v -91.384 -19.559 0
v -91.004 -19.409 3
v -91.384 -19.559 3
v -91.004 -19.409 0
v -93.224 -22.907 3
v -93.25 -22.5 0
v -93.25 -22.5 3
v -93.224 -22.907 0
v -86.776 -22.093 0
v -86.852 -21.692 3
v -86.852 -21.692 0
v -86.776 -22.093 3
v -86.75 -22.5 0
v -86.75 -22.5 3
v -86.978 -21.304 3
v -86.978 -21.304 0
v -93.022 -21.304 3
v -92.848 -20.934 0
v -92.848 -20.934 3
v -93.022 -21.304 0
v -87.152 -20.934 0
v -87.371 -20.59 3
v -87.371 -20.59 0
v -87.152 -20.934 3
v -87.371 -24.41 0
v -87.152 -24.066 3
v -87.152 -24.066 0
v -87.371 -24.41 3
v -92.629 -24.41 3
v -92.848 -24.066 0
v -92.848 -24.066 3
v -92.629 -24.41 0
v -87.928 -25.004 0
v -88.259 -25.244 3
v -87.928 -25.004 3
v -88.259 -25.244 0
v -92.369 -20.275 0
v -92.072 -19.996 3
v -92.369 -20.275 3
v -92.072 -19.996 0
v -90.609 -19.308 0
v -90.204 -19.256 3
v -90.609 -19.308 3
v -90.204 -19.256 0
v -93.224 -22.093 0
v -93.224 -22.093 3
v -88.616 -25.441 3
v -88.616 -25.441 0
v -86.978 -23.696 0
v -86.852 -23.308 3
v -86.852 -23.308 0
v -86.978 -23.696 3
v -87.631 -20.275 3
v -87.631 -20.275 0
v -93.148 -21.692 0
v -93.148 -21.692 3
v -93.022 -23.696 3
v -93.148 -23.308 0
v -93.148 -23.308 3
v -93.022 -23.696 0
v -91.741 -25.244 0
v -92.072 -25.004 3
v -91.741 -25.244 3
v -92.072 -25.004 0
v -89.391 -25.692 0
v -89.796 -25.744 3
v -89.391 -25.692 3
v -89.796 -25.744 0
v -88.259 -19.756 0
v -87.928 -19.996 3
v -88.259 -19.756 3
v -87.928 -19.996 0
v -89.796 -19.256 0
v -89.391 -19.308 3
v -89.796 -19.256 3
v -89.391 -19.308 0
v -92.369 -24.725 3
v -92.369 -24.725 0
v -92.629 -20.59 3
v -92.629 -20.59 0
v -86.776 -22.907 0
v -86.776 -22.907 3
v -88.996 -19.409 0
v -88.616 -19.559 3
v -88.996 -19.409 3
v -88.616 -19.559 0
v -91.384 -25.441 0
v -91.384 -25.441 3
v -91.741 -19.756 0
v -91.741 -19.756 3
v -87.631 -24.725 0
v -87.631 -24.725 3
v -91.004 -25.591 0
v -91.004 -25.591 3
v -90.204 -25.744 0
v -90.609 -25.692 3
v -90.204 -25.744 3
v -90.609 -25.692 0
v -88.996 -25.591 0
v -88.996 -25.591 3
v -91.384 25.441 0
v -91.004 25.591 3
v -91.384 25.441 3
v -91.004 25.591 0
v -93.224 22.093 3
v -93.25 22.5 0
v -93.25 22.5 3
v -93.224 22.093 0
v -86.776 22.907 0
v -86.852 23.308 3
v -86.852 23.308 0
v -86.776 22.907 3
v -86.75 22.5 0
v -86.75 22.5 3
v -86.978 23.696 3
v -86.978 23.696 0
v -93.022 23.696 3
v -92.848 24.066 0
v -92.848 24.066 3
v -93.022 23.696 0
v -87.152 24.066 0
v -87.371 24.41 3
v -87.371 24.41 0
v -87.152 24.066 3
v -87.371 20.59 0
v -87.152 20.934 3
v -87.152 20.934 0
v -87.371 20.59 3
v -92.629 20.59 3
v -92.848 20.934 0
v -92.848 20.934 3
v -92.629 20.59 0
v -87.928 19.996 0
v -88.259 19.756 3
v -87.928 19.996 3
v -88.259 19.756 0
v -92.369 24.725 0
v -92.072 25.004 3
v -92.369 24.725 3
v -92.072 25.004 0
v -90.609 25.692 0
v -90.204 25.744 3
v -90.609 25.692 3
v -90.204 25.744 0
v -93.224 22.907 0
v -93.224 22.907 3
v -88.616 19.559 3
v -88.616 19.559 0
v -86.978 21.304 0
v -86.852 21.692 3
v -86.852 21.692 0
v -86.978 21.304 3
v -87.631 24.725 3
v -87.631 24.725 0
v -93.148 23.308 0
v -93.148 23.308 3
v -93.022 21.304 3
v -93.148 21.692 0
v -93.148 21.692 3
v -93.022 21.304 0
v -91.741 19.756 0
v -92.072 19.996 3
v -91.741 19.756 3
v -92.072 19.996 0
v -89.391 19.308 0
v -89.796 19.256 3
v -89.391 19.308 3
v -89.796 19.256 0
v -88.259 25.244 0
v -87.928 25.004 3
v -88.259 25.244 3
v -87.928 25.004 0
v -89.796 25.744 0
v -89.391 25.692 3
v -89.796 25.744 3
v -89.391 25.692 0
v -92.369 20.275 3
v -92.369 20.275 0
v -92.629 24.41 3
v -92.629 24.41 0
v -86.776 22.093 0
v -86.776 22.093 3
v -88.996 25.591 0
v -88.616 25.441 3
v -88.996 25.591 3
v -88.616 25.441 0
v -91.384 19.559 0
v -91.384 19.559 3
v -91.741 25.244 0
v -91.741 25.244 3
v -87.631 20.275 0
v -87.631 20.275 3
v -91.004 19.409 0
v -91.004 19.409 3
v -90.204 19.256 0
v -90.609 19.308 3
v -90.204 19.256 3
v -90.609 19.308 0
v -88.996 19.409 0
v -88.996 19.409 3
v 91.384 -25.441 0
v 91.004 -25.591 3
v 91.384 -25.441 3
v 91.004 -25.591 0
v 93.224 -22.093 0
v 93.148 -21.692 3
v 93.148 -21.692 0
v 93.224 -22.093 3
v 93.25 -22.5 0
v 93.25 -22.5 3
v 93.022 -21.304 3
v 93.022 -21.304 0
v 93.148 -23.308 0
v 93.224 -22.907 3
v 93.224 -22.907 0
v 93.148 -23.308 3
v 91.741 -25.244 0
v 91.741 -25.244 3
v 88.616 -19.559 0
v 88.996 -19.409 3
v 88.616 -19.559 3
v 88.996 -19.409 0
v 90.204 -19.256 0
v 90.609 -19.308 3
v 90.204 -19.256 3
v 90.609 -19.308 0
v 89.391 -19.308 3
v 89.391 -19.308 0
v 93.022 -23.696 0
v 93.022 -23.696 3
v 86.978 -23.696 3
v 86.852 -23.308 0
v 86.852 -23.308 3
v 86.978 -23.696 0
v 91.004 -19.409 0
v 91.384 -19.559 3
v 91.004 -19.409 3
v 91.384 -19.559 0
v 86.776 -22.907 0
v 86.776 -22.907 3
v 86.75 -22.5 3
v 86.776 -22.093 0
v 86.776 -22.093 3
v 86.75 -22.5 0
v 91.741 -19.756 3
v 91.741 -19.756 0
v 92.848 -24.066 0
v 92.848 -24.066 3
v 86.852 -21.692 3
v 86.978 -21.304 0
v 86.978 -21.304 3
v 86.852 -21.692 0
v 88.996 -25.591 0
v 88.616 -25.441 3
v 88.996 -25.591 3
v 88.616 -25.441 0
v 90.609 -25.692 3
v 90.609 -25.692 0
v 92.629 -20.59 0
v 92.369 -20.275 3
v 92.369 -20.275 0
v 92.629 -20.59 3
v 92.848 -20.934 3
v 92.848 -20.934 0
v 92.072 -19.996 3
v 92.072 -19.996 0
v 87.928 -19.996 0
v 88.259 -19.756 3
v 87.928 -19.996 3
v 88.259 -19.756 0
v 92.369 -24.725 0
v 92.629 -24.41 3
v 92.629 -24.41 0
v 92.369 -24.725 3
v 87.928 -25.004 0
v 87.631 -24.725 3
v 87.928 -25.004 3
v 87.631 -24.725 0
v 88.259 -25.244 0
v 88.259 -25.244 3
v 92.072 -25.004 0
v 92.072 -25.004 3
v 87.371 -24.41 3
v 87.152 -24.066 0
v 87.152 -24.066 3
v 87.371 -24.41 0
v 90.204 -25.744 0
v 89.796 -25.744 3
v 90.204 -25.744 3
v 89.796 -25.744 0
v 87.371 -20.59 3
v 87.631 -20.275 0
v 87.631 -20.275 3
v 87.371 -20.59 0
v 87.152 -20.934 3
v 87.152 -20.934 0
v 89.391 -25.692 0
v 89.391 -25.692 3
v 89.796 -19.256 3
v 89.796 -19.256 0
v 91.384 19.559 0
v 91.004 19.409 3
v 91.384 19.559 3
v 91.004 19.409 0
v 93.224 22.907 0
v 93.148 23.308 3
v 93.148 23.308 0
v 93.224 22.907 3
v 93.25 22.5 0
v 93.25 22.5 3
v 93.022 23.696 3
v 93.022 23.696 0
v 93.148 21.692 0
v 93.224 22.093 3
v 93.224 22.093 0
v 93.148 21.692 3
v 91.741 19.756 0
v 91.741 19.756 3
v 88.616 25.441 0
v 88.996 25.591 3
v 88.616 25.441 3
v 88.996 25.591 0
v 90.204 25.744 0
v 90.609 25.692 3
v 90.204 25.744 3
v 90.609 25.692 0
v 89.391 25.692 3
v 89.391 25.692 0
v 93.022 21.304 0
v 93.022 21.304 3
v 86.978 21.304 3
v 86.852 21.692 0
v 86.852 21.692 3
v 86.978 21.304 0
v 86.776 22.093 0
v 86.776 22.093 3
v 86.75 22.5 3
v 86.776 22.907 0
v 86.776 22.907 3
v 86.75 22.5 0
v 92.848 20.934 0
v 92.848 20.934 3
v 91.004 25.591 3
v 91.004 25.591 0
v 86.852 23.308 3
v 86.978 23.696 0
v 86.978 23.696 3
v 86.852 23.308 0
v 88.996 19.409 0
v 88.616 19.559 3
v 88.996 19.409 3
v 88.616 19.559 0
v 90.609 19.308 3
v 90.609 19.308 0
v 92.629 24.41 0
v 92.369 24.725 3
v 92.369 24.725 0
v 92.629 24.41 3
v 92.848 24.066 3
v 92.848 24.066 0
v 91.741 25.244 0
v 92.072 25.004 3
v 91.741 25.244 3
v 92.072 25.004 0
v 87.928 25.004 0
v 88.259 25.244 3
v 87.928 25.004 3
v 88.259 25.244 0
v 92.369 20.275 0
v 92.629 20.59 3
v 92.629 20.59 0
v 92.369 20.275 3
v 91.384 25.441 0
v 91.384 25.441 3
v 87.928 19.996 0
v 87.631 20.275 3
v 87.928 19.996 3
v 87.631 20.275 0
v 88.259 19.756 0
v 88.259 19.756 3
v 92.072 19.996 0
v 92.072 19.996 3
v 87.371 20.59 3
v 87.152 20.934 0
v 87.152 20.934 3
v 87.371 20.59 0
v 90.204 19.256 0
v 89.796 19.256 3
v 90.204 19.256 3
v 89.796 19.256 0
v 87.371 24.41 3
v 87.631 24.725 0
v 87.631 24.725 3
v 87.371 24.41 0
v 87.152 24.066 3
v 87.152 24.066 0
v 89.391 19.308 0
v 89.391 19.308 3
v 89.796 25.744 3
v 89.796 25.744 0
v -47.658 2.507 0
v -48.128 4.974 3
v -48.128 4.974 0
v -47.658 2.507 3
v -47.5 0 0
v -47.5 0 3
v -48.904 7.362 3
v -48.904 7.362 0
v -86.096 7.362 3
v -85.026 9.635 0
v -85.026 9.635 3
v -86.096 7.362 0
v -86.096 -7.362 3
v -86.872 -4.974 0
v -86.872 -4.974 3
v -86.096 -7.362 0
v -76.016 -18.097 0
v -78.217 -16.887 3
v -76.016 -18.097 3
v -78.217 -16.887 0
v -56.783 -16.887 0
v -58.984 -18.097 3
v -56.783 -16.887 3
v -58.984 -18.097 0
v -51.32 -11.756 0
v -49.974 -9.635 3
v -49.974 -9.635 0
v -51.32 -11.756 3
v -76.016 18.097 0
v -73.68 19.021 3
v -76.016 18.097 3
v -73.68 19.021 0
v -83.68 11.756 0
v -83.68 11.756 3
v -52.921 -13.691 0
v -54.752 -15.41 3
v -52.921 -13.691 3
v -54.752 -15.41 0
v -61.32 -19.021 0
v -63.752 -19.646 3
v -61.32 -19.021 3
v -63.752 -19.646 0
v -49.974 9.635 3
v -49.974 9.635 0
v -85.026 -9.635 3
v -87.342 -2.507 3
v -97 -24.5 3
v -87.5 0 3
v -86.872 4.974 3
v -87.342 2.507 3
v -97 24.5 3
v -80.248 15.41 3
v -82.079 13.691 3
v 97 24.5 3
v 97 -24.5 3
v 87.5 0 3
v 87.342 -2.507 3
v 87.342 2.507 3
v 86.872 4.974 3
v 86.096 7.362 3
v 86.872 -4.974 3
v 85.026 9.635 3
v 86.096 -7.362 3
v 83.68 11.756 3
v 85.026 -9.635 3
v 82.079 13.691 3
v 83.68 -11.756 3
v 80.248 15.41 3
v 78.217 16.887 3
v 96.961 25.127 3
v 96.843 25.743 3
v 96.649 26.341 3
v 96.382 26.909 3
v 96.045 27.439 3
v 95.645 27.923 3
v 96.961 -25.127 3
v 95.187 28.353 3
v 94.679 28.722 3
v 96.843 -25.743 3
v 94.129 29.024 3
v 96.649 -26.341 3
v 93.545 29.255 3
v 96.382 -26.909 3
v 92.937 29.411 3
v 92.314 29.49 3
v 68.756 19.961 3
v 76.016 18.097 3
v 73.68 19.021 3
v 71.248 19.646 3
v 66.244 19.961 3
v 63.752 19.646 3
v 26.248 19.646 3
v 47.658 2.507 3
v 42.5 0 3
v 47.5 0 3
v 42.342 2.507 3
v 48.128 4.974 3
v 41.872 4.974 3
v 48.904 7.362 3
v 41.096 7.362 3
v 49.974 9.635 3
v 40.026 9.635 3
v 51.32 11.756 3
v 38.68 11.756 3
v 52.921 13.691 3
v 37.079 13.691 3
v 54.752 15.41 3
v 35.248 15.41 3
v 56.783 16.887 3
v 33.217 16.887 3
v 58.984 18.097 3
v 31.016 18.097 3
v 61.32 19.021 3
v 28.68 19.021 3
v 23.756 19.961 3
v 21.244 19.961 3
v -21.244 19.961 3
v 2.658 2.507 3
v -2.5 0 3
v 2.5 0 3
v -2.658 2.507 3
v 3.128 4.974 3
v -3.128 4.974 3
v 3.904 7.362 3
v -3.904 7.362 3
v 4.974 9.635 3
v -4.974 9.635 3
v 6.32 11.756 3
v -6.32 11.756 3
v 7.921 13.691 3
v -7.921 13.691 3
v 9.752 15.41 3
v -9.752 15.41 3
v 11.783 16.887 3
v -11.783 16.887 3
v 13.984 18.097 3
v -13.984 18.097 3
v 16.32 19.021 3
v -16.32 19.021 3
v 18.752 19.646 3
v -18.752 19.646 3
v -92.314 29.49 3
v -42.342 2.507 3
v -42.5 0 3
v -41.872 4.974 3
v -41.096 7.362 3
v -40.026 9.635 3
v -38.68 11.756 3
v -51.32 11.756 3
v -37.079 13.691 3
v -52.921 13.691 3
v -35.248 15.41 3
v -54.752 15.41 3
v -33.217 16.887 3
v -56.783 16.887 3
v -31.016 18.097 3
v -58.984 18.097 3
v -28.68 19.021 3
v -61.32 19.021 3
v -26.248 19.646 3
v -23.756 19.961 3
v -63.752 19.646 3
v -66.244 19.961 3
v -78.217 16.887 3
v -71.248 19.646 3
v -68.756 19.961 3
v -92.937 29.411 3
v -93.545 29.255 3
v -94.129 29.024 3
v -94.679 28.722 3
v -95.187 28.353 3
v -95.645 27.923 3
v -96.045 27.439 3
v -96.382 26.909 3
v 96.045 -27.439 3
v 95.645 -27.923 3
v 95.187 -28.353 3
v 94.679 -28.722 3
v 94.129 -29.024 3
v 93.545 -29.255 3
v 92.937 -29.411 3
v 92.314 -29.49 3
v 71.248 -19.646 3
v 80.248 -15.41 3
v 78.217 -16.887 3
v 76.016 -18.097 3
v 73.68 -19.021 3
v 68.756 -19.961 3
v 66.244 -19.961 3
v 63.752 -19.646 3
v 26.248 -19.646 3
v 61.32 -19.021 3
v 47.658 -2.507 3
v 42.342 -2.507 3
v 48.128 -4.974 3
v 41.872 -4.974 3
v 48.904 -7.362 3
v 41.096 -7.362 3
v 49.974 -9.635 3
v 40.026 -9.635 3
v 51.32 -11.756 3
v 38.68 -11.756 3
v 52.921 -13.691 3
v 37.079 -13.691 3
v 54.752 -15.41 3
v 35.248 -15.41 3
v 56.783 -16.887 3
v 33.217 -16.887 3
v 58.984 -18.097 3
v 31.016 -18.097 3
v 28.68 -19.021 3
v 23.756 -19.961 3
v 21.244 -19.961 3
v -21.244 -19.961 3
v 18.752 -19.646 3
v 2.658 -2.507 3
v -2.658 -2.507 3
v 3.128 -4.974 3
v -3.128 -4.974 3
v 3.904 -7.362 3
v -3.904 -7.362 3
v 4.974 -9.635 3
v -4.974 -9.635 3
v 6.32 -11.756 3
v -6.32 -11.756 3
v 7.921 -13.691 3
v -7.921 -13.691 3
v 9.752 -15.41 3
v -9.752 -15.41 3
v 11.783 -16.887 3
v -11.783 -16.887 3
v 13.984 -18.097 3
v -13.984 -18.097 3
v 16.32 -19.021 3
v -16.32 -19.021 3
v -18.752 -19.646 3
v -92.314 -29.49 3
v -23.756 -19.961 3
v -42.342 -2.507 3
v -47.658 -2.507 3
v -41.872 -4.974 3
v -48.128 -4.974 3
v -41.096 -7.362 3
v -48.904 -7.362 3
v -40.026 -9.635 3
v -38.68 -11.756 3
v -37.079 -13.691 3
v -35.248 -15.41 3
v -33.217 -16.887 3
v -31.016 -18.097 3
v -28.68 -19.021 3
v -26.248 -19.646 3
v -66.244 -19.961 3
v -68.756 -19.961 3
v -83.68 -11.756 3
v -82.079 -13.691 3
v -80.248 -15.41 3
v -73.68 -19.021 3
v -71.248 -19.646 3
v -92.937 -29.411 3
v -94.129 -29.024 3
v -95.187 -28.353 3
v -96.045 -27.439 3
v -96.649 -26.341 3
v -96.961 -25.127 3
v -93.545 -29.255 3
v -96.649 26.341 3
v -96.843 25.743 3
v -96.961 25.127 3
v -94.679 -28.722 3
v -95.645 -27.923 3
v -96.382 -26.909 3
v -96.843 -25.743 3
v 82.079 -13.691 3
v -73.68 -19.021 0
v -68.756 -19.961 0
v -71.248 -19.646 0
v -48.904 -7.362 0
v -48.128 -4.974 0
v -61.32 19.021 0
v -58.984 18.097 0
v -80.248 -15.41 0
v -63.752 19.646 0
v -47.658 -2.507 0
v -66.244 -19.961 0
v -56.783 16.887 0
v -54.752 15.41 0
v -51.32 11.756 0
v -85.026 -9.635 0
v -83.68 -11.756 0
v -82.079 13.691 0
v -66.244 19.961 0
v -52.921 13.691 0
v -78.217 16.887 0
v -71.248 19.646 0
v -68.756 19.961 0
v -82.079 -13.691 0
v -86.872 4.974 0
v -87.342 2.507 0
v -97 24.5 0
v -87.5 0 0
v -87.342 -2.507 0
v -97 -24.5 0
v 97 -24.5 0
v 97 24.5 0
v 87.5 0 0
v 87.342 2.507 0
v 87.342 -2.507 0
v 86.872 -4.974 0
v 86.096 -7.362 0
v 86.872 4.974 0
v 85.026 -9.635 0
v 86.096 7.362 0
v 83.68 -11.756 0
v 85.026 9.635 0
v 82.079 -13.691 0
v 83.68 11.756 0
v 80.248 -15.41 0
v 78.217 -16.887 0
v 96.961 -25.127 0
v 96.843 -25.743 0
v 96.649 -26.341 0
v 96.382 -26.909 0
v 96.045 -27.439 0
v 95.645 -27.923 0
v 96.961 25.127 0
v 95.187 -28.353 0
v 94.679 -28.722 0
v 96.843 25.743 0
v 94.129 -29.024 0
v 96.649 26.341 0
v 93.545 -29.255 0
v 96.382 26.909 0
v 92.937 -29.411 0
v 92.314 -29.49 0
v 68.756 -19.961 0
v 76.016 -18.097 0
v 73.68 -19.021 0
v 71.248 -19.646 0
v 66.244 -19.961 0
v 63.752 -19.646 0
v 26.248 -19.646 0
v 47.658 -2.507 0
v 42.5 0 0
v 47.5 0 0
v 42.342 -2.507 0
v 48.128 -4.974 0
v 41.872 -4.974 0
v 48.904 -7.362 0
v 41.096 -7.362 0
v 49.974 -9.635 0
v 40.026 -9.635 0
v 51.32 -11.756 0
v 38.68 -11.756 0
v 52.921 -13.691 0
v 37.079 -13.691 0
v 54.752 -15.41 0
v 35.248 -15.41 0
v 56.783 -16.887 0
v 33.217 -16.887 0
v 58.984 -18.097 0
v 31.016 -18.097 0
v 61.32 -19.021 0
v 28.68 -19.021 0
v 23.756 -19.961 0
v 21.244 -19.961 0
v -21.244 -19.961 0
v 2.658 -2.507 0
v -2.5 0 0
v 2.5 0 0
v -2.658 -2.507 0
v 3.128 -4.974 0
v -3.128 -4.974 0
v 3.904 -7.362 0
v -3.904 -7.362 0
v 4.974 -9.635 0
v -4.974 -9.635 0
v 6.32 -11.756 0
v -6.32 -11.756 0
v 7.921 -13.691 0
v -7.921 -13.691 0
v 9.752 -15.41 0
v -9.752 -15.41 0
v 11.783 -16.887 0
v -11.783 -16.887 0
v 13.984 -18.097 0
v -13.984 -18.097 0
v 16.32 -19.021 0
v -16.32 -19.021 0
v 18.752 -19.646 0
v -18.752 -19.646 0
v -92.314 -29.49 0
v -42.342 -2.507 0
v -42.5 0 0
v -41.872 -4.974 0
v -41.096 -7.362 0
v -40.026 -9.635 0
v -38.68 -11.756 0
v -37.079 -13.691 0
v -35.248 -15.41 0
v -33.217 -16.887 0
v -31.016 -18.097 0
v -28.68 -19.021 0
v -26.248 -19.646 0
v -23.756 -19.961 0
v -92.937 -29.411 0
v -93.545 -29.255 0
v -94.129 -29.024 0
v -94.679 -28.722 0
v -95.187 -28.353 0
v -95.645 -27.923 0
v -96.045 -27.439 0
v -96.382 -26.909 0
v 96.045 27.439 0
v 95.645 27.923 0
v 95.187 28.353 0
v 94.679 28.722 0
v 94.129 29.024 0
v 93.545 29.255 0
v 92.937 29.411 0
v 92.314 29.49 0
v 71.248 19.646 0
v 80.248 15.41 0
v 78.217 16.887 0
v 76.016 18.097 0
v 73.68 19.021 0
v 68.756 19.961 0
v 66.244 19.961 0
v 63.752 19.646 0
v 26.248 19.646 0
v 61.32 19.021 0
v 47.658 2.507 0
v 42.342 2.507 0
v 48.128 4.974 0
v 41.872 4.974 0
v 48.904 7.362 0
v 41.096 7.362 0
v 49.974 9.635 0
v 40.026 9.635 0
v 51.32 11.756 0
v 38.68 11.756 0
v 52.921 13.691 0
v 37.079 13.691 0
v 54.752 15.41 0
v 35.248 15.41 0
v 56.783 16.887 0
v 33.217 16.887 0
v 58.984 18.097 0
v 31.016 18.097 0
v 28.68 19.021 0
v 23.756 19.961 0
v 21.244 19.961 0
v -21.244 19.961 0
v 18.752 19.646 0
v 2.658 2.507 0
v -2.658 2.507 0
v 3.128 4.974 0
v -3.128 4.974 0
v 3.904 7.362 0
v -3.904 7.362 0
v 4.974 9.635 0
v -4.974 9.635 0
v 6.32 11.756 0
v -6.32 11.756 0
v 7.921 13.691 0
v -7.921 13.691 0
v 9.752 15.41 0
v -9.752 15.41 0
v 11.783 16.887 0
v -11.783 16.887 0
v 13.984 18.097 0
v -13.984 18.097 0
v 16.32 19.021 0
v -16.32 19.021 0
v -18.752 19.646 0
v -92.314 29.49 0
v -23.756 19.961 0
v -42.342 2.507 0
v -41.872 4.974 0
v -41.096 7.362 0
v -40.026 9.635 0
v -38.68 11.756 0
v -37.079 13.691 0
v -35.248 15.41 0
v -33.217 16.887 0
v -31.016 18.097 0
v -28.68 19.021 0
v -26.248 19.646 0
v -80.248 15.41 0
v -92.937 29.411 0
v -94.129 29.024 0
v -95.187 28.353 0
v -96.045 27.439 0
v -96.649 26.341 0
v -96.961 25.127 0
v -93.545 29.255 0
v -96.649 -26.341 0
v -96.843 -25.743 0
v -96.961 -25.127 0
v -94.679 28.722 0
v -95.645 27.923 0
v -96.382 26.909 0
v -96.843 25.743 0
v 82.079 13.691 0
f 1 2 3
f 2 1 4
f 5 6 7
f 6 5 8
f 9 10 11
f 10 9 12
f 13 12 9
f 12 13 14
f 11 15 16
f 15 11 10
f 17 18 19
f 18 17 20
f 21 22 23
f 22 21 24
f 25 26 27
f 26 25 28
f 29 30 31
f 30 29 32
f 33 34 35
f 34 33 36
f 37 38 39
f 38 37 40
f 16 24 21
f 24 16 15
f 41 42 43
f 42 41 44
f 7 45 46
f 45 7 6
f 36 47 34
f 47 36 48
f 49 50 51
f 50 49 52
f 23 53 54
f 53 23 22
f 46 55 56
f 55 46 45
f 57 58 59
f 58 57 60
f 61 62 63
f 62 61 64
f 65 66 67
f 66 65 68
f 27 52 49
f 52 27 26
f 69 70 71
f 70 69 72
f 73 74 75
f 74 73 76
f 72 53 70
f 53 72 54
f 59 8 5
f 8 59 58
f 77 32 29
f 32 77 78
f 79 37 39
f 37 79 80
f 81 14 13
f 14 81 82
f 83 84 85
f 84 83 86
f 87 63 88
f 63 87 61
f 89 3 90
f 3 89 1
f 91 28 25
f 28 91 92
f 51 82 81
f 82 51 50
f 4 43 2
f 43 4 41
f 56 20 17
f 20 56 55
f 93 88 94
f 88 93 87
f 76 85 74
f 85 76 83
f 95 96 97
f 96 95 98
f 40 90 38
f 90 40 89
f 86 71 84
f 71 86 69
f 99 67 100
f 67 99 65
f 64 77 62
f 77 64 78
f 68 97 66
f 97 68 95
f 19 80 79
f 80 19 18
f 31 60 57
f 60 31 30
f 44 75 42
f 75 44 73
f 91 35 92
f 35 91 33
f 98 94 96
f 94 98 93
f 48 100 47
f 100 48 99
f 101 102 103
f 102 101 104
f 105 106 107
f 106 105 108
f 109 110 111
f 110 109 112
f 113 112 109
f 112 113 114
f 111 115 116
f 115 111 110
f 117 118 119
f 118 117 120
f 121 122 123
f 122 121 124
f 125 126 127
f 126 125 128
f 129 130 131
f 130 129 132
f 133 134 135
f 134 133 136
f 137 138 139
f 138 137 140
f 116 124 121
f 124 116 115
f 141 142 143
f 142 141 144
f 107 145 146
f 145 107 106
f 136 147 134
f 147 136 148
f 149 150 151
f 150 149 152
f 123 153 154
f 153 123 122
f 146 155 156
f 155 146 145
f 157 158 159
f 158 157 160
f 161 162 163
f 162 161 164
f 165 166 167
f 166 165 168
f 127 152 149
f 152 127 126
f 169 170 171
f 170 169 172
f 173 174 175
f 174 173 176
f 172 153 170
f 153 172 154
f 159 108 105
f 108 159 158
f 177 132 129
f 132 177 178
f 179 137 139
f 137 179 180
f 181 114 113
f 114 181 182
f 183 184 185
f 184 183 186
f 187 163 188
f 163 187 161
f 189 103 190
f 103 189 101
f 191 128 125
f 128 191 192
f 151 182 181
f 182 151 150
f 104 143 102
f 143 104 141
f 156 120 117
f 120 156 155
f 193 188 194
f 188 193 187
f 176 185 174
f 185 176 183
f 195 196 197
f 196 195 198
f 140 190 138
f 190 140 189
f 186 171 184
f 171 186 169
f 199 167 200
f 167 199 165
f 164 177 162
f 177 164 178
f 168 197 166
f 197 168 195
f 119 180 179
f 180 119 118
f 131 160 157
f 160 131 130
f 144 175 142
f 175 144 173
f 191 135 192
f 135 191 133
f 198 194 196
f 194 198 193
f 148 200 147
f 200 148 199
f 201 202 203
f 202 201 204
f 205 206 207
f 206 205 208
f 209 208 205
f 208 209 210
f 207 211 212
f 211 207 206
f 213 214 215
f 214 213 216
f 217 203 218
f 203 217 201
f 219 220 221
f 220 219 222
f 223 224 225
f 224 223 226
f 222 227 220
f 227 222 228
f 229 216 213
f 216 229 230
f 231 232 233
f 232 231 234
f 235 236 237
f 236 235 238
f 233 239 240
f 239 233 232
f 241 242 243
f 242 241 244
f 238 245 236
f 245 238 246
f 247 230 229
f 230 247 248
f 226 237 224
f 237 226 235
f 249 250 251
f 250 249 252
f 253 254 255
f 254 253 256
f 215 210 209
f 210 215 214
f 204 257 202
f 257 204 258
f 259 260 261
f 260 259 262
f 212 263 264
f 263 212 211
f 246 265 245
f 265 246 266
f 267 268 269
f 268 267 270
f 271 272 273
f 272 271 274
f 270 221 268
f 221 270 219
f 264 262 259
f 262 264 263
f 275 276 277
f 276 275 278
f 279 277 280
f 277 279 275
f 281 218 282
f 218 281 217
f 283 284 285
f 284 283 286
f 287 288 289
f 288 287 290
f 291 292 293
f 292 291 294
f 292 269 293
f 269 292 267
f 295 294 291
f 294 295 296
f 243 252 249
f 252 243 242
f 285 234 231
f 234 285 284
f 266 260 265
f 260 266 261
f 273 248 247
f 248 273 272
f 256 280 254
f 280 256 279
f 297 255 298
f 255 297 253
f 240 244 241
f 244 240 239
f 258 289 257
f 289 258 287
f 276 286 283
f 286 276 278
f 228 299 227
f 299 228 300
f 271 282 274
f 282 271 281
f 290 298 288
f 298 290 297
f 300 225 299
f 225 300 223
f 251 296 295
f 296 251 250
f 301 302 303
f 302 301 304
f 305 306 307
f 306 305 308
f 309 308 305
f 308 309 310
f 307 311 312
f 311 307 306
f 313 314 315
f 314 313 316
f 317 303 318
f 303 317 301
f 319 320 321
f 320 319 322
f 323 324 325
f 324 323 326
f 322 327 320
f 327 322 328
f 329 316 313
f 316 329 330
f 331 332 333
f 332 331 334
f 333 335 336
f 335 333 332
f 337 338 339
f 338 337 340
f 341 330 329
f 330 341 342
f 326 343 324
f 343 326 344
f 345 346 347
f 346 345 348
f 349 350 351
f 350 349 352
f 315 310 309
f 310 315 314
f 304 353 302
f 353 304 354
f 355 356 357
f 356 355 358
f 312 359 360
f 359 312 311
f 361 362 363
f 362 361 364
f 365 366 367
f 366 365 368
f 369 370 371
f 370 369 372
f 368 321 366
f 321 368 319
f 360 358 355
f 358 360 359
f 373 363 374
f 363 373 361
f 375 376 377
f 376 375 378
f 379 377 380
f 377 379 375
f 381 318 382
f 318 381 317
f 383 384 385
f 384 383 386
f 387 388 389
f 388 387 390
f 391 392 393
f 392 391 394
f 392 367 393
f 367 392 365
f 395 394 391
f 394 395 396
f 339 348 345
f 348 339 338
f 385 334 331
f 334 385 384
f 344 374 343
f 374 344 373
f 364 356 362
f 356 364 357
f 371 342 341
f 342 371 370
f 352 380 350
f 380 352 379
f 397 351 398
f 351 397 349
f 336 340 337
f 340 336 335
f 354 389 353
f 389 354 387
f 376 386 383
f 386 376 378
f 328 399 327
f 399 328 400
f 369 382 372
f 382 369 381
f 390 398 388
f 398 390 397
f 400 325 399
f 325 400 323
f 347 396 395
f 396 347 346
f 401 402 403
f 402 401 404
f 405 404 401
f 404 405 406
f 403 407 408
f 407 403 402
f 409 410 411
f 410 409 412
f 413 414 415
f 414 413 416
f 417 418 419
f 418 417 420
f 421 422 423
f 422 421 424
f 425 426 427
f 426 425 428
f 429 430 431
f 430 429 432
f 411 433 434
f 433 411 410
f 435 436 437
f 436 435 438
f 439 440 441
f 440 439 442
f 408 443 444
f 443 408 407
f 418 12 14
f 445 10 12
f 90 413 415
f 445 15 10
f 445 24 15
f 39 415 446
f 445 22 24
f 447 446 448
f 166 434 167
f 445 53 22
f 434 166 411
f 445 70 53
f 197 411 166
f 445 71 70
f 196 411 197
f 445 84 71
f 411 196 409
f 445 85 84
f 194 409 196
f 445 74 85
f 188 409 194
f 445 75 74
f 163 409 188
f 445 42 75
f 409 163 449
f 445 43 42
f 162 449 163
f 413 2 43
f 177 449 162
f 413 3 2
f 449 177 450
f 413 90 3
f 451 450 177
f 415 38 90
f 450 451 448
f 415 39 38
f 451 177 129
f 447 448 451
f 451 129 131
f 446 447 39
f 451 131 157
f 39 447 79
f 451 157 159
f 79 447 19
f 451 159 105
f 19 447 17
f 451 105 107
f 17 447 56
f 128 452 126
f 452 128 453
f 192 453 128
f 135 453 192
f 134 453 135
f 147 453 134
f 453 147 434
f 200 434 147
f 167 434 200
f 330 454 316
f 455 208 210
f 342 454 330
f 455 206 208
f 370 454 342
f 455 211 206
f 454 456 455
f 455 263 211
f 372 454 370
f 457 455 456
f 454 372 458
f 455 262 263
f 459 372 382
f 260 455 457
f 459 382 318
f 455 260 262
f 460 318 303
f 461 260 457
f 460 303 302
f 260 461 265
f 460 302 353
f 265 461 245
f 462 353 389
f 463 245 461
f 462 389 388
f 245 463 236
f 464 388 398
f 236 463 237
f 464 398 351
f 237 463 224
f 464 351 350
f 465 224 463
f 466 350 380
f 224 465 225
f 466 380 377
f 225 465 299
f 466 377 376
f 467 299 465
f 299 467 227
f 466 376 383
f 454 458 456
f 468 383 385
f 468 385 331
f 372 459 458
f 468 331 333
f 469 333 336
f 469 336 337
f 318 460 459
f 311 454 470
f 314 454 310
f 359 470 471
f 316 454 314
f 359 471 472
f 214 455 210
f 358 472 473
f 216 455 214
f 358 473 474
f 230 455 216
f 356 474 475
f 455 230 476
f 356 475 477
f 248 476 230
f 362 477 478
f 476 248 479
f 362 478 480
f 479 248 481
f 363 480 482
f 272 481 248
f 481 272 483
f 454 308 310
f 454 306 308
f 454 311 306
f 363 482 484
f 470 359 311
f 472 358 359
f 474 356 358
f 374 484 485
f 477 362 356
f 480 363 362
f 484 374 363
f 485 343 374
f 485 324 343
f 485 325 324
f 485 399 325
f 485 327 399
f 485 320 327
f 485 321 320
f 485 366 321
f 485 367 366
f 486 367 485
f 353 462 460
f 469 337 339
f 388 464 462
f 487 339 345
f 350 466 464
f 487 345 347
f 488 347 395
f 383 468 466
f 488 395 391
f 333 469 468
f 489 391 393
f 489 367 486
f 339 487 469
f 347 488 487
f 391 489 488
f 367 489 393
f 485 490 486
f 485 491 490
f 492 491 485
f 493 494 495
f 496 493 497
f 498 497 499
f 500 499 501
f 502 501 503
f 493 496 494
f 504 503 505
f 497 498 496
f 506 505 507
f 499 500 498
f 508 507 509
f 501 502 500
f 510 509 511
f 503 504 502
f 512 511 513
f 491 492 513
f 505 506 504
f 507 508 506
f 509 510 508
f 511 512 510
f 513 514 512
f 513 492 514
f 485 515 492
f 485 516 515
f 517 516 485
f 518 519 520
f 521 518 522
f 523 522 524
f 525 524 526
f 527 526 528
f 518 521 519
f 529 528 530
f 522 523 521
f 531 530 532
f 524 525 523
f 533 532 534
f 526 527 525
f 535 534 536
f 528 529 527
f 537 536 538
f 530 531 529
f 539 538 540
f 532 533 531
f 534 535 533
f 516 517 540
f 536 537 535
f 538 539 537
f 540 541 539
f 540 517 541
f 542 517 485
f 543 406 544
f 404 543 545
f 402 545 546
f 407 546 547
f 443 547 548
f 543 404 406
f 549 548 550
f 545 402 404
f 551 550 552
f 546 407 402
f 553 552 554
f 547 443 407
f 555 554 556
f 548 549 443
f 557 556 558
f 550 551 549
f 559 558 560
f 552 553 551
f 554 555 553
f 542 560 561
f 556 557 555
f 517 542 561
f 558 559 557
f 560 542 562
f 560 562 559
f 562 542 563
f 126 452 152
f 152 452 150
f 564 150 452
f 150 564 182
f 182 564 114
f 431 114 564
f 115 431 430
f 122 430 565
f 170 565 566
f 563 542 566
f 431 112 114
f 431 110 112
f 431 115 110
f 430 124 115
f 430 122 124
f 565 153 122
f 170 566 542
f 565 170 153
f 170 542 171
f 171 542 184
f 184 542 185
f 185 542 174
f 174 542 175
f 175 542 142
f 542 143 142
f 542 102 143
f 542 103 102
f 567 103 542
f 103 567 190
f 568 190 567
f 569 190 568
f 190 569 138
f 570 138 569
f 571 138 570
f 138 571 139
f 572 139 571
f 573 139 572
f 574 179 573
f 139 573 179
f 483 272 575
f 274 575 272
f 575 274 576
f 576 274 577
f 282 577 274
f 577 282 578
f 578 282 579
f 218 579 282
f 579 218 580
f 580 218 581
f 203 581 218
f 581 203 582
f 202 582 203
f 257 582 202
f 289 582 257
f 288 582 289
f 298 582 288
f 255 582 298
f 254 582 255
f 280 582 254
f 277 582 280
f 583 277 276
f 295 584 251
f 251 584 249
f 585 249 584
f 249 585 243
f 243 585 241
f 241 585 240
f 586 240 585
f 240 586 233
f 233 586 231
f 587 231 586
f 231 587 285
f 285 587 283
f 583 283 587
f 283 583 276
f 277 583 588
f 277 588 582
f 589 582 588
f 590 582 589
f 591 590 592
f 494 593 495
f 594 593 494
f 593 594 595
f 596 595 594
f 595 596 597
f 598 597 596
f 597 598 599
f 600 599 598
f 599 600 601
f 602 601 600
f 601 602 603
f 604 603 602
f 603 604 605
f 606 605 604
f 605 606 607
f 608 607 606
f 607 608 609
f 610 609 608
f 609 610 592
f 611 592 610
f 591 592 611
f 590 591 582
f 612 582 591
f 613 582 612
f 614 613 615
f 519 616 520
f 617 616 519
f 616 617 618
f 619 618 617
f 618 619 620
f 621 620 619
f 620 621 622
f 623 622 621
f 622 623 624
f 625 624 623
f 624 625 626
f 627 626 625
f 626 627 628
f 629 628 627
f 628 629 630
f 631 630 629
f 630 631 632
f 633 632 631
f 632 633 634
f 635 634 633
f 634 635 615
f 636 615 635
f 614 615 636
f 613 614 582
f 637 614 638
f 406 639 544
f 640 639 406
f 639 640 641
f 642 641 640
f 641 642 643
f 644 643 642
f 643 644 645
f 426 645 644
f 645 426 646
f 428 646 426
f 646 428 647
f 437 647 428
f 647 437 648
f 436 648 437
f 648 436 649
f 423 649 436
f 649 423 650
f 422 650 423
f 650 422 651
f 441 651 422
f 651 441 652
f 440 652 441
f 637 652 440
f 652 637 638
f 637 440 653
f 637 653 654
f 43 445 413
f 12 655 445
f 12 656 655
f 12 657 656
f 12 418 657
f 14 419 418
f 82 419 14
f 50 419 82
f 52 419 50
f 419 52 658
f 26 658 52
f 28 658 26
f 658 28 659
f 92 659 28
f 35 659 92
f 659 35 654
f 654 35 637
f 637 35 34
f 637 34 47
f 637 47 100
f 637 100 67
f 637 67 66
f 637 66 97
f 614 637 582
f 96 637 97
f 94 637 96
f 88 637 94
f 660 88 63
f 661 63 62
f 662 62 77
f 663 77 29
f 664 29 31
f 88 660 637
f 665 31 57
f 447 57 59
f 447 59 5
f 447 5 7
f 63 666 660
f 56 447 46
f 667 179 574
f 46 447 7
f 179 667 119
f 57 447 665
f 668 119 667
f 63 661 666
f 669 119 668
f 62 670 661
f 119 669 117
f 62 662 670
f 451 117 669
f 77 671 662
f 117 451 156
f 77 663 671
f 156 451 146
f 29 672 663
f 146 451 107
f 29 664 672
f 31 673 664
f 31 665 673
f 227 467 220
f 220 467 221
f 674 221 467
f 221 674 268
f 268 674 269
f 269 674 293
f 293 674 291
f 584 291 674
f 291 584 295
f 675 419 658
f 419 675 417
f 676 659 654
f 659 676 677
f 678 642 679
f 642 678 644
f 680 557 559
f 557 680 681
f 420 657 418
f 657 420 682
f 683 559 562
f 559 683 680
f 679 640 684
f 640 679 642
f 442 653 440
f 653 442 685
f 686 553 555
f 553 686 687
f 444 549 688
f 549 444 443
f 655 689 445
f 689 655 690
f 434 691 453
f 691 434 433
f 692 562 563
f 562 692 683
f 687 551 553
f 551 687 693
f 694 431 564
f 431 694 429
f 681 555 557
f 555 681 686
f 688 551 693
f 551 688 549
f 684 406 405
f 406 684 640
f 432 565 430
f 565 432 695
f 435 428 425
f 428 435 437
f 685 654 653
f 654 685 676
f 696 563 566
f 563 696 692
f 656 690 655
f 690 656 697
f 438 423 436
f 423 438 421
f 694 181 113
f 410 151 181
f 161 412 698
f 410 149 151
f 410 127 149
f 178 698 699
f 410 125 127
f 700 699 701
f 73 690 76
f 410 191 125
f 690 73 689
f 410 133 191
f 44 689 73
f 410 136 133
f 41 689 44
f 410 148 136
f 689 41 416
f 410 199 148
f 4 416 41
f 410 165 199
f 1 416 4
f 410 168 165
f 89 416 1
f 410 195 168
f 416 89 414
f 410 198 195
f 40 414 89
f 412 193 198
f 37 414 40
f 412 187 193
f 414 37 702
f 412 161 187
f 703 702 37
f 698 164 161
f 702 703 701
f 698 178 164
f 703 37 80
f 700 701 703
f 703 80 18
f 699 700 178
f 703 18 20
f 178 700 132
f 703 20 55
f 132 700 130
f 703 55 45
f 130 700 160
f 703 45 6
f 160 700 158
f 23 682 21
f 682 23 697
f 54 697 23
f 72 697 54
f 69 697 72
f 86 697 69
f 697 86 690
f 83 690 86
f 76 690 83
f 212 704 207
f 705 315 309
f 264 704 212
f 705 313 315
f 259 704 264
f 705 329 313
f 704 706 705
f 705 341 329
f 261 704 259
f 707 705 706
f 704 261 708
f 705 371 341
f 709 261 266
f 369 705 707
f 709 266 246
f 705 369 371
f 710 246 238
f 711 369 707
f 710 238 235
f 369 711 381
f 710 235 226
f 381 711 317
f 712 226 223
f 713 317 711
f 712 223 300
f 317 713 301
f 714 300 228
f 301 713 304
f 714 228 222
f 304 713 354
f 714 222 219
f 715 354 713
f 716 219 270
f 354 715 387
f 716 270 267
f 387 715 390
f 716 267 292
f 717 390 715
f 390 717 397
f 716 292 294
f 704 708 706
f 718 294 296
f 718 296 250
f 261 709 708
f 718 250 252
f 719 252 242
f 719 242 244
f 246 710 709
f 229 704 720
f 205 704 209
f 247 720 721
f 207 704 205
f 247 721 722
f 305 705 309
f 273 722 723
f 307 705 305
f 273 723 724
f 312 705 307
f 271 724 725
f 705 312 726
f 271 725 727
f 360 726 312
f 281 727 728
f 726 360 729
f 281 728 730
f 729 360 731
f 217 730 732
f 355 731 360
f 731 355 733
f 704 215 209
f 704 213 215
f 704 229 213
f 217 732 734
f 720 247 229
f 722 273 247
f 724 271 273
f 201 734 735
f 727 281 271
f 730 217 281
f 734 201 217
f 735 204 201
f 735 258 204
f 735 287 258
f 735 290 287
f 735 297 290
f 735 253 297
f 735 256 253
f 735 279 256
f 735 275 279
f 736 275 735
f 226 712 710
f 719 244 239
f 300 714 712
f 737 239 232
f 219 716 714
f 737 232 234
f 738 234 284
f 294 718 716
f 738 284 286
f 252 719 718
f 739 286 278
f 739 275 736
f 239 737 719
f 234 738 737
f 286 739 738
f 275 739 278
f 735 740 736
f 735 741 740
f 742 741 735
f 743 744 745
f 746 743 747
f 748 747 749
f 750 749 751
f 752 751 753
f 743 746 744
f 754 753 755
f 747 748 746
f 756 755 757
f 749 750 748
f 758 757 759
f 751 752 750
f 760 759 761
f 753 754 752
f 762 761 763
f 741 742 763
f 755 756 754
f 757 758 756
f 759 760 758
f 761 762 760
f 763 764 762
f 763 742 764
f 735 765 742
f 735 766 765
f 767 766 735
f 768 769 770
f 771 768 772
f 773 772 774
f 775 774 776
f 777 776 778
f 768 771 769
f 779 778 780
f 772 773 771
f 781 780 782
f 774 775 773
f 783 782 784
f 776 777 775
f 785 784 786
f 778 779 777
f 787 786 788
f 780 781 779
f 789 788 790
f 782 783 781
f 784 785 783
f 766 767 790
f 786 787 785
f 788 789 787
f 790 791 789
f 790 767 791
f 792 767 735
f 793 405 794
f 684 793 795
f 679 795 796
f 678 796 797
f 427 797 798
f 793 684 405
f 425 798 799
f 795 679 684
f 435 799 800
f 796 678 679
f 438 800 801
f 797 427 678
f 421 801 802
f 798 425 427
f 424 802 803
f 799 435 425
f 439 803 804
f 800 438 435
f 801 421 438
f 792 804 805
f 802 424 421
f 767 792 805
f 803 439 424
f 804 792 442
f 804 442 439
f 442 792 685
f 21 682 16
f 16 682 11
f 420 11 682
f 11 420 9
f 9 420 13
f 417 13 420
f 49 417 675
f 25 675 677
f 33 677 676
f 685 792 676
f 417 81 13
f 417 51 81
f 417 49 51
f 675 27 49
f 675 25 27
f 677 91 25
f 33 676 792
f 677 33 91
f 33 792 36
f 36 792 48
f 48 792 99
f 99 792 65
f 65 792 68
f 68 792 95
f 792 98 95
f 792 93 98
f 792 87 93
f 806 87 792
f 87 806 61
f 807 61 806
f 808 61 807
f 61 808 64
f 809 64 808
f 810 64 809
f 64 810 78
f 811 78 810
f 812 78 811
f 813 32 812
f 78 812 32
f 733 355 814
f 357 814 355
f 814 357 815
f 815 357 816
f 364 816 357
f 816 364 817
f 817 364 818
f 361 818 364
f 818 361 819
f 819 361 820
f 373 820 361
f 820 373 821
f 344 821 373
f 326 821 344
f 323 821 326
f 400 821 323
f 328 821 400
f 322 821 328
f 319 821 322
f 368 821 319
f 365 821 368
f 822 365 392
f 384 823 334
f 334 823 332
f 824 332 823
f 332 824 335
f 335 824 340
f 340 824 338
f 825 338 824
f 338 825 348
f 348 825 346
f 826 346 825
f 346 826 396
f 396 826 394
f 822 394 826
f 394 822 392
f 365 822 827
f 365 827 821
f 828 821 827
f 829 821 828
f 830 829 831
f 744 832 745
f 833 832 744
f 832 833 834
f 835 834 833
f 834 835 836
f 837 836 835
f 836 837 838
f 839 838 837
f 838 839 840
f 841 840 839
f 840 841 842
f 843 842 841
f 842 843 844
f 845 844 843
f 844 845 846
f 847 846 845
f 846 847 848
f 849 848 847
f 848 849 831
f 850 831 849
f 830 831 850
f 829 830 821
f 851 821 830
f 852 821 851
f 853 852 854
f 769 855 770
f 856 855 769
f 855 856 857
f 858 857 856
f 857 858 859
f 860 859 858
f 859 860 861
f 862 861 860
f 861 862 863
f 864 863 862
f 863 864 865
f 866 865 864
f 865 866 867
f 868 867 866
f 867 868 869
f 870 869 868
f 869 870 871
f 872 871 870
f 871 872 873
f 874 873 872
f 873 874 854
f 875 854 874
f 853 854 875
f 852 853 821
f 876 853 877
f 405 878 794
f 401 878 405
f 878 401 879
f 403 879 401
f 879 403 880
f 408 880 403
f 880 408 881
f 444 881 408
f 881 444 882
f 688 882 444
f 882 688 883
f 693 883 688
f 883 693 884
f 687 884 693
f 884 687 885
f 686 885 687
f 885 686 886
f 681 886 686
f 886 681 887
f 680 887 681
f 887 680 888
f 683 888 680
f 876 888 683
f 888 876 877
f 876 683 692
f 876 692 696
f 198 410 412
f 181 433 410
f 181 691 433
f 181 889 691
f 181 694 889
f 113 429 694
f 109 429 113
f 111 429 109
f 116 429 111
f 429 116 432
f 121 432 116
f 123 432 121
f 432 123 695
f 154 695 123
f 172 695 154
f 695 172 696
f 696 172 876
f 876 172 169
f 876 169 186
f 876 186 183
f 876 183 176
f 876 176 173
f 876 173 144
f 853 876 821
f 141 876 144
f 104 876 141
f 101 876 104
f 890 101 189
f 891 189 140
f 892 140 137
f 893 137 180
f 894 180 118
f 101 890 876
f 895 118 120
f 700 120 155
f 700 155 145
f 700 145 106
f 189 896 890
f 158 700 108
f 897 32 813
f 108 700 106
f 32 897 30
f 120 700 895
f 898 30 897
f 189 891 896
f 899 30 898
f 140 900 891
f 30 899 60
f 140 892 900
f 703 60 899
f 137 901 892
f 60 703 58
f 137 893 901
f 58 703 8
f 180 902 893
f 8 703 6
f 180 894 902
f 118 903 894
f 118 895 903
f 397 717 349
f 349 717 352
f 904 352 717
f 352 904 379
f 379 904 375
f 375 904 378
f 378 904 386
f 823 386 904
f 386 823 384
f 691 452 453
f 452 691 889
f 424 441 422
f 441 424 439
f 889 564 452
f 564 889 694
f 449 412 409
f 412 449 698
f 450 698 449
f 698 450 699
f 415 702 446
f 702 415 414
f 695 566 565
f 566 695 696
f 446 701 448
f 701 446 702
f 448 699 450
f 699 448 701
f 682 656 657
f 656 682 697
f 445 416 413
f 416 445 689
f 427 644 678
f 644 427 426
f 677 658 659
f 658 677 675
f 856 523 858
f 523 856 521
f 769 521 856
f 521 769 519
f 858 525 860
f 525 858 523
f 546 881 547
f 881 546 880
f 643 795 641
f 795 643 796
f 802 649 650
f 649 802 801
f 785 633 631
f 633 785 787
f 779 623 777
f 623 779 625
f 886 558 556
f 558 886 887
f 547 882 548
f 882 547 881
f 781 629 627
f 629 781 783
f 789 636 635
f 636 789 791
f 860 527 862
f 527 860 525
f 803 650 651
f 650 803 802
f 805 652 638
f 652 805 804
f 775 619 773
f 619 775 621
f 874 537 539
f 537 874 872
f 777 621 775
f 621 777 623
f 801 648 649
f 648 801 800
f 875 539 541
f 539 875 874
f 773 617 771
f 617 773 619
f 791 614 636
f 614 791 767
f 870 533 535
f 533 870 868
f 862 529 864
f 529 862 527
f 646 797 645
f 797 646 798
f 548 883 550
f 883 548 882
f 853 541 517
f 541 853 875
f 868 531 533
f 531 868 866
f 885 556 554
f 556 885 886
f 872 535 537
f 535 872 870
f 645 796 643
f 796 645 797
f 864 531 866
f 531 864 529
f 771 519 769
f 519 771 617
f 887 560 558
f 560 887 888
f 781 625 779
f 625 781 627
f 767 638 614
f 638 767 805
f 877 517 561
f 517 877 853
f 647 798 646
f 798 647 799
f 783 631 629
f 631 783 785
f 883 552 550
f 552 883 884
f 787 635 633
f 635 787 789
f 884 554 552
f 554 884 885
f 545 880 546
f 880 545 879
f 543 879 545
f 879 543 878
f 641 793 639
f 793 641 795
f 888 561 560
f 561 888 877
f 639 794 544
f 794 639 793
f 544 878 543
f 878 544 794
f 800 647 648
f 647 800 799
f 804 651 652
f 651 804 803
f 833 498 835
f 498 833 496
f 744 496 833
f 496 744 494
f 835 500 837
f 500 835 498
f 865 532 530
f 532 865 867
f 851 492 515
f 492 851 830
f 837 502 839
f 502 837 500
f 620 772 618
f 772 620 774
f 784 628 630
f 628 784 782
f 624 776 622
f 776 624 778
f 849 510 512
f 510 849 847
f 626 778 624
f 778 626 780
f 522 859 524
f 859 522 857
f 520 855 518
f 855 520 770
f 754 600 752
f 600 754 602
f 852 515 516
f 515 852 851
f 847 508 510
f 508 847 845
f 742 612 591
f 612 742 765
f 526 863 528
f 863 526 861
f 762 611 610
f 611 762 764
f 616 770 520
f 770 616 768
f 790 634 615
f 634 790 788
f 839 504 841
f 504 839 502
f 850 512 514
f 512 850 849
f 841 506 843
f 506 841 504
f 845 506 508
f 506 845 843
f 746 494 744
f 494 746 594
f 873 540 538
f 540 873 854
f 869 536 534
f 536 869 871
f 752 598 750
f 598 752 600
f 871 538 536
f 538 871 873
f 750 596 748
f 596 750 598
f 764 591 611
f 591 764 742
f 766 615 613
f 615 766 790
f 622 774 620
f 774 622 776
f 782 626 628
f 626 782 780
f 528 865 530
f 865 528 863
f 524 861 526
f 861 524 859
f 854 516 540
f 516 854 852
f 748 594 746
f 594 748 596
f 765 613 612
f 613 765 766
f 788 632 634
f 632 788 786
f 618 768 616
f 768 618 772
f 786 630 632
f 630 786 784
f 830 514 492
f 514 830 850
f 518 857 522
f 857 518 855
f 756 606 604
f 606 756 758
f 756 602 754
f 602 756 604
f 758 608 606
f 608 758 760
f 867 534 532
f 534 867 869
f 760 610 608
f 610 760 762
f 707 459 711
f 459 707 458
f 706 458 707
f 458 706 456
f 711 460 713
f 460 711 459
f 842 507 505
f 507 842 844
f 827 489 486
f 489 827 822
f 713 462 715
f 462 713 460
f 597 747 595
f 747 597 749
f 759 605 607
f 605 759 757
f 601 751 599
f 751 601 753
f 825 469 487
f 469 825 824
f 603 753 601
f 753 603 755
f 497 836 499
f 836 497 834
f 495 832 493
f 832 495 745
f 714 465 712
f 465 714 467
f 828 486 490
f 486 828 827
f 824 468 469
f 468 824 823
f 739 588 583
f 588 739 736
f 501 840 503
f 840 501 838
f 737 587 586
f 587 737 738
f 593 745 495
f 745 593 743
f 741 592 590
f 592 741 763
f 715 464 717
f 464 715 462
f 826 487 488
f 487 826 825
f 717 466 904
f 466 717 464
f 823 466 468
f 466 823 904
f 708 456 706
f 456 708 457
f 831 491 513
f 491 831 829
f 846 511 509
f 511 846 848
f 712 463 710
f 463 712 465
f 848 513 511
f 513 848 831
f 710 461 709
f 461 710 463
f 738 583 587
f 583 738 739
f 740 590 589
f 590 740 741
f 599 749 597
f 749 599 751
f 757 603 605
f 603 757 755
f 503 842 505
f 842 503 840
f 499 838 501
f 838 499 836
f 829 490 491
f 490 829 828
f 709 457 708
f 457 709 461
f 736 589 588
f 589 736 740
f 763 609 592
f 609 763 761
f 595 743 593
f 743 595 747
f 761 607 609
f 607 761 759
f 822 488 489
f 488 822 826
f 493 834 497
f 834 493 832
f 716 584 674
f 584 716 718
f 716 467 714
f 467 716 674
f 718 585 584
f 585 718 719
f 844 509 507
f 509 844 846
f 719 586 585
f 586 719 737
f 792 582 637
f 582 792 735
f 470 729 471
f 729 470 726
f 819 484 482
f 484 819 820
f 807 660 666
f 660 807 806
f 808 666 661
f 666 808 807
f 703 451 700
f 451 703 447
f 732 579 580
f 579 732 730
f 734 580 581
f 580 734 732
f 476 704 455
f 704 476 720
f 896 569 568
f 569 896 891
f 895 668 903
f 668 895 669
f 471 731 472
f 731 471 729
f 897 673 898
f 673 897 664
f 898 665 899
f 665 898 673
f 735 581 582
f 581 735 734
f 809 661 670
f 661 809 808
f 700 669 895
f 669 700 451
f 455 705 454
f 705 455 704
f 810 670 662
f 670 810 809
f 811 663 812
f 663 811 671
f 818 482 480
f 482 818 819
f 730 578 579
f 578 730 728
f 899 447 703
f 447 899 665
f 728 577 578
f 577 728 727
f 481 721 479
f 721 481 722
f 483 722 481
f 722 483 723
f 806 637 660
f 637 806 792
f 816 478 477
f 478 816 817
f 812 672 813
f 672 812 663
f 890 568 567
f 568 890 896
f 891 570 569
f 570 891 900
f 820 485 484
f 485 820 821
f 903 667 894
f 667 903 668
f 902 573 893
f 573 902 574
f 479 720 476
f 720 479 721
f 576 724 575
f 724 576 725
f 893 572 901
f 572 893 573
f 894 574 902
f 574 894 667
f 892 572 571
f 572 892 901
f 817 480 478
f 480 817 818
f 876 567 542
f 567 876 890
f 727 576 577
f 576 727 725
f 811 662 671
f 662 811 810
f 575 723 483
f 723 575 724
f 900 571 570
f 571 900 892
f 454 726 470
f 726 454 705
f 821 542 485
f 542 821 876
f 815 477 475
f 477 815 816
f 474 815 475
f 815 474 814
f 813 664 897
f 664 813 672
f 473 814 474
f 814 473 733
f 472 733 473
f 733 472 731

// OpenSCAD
$fn = 50;


difference() {
	union() {
		hull() {
			translate(v = [-92.0000000000, 24.5000000000, 0]) {
				cylinder(h = 3, r = 5);
			}
			translate(v = [92.0000000000, 24.5000000000, 0]) {
				cylinder(h = 3, r = 5);
			}
			translate(v = [-92.0000000000, -24.5000000000, 0]) {
				cylinder(h = 3, r = 5);
			}
			translate(v = [92.0000000000, -24.5000000000, 0]) {
				cylinder(h = 3, r = 5);
			}
		}
	}
	union() {
		#translate(v = [-90.0000000000, -22.5000000000, -100.0000000000]) {
			cylinder(h = 200, r = 3.2500000000);
		}
		#translate(v = [-90.0000000000, 22.5000000000, -100.0000000000]) {
			cylinder(h = 200, r = 3.2500000000);
		}
		#translate(v = [90.0000000000, -22.5000000000, -100.0000000000]) {
			cylinder(h = 200, r = 3.2500000000);
		}
		#translate(v = [90.0000000000, 22.5000000000, -100.0000000000]) {
			cylinder(h = 200, r = 3.2500000000);
		}
		#translate(v = [-67.5000000000, 0, 0]) {
			cylinder(h = 3, r = 20.0000000000);
		}
		#translate(v = [-22.5000000000, 0, 0]) {
			cylinder(h = 3, r = 20.0000000000);
		}
		#translate(v = [22.5000000000, 0, 0]) {
			cylinder(h = 3, r = 20.0000000000);
		}
		#translate(v = [67.5000000000, 0, 0]) {
			cylinder(h = 3, r = 20.0000000000);
		}
	}
}
